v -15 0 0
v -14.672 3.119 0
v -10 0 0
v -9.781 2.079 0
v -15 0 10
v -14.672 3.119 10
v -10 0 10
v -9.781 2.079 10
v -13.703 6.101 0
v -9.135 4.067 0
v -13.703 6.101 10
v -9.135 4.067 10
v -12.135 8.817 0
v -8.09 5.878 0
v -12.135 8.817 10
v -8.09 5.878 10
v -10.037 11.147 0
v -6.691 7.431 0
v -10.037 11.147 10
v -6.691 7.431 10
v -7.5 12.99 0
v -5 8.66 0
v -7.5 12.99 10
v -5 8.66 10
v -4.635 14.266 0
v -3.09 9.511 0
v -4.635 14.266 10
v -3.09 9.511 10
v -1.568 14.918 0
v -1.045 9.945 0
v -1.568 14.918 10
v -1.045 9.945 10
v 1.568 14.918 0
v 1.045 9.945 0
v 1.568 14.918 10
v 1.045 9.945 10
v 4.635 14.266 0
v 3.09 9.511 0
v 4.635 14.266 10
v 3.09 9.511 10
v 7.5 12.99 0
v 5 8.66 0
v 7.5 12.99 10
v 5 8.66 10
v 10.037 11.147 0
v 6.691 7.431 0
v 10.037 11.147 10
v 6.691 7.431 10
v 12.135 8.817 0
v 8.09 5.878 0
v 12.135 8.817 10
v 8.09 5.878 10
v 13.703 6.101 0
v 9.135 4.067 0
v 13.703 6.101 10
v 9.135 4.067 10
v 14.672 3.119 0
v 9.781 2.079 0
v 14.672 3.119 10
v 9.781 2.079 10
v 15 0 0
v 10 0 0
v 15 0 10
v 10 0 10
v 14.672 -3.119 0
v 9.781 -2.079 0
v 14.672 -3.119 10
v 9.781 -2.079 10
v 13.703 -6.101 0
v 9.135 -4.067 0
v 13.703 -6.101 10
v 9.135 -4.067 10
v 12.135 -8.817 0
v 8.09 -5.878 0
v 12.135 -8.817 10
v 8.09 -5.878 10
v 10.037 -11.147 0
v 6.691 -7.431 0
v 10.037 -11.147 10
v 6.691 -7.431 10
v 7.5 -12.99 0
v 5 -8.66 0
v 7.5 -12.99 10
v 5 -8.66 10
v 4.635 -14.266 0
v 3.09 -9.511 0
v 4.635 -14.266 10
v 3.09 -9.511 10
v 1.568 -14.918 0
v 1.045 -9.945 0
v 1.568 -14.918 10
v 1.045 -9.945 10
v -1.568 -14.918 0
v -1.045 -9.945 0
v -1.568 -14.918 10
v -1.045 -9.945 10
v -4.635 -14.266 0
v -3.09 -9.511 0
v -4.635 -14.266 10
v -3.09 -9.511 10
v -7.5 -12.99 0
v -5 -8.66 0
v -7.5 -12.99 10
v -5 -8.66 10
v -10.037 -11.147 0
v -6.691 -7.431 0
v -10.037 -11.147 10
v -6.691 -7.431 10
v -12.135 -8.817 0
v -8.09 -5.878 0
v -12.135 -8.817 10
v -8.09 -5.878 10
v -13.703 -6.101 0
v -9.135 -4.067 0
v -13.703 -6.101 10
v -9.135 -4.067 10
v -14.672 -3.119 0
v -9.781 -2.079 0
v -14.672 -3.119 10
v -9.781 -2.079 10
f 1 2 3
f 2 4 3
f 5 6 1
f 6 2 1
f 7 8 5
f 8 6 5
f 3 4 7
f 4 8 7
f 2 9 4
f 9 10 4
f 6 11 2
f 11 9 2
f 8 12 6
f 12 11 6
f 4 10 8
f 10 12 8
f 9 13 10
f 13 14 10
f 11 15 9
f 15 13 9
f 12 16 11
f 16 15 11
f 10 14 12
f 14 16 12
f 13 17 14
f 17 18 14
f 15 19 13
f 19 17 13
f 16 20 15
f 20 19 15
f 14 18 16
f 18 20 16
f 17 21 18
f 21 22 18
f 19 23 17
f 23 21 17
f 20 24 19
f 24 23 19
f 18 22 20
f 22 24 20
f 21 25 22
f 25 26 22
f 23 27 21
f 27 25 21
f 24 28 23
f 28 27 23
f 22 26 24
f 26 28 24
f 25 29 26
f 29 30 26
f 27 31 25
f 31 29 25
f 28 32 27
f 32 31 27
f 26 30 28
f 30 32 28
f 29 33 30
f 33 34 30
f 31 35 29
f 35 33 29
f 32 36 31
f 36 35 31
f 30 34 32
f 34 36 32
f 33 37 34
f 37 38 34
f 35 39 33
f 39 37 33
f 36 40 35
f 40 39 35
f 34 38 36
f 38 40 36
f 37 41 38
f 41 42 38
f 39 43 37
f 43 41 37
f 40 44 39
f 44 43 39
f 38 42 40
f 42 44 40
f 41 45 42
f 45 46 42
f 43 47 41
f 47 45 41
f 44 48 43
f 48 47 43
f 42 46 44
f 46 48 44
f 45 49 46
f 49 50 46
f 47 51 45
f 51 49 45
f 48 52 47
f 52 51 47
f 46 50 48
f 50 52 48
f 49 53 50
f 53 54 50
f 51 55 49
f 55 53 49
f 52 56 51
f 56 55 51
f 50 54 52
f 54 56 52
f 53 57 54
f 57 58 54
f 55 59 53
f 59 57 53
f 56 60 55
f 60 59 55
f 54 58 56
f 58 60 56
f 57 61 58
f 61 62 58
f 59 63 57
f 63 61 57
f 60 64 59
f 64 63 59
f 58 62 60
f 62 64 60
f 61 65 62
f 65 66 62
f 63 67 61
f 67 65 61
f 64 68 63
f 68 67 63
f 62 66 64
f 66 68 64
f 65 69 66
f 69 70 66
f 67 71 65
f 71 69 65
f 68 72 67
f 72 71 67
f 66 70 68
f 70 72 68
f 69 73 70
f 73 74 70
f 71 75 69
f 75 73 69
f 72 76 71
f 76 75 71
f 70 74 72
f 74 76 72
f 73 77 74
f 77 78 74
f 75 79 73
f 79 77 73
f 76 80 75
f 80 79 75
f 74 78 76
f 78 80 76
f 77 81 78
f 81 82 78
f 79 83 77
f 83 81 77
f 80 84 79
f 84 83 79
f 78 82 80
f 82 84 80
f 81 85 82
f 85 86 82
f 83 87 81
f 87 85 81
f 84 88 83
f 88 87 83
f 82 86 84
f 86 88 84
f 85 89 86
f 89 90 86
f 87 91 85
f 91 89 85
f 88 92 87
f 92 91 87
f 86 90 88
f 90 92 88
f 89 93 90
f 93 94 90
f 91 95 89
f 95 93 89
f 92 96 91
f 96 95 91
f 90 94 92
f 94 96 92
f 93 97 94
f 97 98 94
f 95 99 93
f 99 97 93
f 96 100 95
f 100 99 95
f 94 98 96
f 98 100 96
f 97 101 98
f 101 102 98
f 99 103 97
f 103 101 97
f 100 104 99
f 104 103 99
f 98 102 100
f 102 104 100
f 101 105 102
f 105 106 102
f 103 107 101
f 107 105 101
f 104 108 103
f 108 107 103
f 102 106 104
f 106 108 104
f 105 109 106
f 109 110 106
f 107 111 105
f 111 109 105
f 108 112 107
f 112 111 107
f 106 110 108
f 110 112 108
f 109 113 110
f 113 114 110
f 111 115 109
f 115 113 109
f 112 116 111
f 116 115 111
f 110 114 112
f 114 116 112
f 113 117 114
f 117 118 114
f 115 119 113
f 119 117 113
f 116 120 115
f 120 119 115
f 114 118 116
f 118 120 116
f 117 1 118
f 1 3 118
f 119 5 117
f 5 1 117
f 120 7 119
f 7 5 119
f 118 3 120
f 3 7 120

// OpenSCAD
rotate_extrude(angle = 360)
  translate([10, 0]) square([5, 10]);
